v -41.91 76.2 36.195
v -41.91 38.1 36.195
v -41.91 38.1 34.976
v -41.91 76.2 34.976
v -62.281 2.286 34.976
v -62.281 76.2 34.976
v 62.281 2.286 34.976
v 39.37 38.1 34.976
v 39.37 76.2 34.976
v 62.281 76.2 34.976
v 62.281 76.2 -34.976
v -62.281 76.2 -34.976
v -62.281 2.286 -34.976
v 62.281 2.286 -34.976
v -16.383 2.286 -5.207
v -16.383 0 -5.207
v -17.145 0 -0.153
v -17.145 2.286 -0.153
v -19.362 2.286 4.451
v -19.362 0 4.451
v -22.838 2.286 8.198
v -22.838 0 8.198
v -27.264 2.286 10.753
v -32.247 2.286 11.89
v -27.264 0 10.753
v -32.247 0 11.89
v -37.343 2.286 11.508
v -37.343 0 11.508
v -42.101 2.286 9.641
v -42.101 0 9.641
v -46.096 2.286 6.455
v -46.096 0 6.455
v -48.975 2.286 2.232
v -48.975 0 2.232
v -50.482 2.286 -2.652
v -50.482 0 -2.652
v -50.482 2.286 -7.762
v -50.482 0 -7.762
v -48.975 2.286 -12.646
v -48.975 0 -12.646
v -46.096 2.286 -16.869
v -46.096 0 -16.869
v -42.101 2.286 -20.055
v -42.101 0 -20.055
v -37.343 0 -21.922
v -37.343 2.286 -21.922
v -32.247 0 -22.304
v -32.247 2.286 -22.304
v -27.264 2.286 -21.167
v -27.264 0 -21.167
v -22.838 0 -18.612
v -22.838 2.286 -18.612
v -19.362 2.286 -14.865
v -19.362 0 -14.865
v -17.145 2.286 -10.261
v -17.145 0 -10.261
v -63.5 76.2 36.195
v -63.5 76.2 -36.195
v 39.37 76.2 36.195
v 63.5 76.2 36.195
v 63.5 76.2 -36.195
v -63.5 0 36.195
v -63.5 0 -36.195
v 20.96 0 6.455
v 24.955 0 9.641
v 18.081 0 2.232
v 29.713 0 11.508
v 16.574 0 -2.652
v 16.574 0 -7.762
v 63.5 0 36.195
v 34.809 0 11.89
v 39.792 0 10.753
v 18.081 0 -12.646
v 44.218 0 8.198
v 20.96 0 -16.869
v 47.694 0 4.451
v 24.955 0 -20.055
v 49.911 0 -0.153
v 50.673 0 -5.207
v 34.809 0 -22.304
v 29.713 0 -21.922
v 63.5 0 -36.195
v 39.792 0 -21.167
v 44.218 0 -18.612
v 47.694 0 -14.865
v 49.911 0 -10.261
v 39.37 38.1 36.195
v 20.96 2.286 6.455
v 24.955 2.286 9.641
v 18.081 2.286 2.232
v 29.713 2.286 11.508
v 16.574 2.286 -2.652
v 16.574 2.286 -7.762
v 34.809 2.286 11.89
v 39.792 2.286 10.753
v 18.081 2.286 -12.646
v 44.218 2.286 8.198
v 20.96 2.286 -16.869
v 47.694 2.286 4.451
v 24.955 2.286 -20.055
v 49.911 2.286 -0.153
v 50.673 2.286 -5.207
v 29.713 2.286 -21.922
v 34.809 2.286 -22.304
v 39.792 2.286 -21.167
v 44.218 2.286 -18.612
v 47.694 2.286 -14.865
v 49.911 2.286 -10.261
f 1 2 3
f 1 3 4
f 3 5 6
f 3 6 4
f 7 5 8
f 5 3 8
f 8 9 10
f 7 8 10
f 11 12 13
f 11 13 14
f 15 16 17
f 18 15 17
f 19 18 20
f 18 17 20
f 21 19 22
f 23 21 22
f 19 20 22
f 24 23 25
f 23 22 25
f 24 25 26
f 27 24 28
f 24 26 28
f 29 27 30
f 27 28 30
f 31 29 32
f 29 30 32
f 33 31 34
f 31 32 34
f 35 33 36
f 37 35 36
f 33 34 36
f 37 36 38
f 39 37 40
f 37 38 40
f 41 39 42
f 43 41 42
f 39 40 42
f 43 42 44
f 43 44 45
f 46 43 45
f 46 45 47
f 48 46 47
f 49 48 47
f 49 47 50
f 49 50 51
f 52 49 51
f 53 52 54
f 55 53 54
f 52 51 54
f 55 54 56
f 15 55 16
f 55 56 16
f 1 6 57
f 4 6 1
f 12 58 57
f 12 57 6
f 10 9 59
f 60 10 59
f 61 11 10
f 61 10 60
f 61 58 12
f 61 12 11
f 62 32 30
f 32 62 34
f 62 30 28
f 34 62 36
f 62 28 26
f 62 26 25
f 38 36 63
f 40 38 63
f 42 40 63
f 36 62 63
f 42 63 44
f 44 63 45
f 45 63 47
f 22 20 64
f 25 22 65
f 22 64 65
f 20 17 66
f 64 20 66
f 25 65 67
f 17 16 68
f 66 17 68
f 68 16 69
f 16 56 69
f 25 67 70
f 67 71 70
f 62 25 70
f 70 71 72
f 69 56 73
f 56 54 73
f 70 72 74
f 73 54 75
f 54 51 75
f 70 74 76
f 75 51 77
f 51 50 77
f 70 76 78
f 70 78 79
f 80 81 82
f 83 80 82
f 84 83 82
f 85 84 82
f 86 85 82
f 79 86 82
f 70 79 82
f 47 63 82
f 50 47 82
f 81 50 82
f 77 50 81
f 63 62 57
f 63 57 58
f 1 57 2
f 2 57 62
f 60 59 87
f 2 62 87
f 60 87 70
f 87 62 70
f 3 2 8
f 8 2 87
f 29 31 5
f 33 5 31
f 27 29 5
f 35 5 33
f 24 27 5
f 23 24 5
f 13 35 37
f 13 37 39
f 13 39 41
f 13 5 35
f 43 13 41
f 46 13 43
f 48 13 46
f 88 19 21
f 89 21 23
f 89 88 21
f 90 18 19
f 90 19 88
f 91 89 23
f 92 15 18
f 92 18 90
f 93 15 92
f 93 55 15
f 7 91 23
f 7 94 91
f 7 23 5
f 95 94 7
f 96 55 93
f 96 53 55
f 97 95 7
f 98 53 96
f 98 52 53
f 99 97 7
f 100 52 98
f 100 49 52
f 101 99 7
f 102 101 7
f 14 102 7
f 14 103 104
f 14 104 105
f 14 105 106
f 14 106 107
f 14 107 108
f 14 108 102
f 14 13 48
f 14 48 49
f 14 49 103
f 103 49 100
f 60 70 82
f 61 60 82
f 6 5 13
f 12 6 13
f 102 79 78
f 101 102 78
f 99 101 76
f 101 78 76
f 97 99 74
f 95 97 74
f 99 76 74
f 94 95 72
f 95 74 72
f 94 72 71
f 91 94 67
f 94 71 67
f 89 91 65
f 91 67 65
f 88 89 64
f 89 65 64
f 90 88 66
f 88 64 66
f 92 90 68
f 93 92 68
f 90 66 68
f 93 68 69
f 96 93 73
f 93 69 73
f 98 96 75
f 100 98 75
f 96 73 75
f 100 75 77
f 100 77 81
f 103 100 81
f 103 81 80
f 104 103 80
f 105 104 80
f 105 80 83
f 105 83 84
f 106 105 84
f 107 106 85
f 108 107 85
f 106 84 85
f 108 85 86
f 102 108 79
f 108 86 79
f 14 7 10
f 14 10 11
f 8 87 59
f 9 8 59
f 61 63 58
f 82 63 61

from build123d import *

# Parameters (mm, degrees)
SKETCH1_W           = 127
SKETCH1_H           = 72.39
BOSS_EXTRUDE1_DEPTH = 76.2
SKETCH2_W           = 124.5616
SKETCH2_H           = 69.9516
CUT_EXTRUDE1_DEPTH  = 73.914
SKETCH4_W           = 81.28
SKETCH4_H           = 38.1
CUT_EXTRUDE2_DEPTH  = 1.2192
SKETCH5_R           = 17.145
CUT_EXTRUDE3_DEPTH  = 2.286


with BuildPart() as part:
    # Sketch1 → Boss-Extrude1 (new body)
    with BuildSketch(Plane(origin=(0, 0, 0), x_dir=(1, 0, 0), z_dir=(0, 1, 0))):
        Rectangle(SKETCH1_W, SKETCH1_H)
    extrude(amount=BOSS_EXTRUDE1_DEPTH)

    # Sketch2 → Cut-Extrude1 (cut)
    with BuildSketch(Plane(origin=(0, 76.2, 0), x_dir=(1, 0, 0), z_dir=(0, 1, 0))):
        Rectangle(SKETCH2_W, SKETCH2_H)
    extrude(amount=-CUT_EXTRUDE1_DEPTH, mode=Mode.SUBTRACT)

    # Sketch4 → Cut-Extrude2 (cut)
    with BuildSketch(Plane.XY.offset(36.195)):
        with Locations((-1.27, 57.15)):
            Rectangle(SKETCH4_W, SKETCH4_H)
    extrude(amount=-CUT_EXTRUDE2_DEPTH, mode=Mode.SUBTRACT)

    # Sketch5 → Cut-Extrude3 (cut)
    with BuildSketch(Plane.XZ):
        with Locations((-33.528, -5.207)):
            Circle(SKETCH5_R)
        with Locations((33.528, -5.207)):
            Circle(SKETCH5_R)
    extrude(amount=-CUT_EXTRUDE3_DEPTH, mode=Mode.SUBTRACT)


solid = part.part
